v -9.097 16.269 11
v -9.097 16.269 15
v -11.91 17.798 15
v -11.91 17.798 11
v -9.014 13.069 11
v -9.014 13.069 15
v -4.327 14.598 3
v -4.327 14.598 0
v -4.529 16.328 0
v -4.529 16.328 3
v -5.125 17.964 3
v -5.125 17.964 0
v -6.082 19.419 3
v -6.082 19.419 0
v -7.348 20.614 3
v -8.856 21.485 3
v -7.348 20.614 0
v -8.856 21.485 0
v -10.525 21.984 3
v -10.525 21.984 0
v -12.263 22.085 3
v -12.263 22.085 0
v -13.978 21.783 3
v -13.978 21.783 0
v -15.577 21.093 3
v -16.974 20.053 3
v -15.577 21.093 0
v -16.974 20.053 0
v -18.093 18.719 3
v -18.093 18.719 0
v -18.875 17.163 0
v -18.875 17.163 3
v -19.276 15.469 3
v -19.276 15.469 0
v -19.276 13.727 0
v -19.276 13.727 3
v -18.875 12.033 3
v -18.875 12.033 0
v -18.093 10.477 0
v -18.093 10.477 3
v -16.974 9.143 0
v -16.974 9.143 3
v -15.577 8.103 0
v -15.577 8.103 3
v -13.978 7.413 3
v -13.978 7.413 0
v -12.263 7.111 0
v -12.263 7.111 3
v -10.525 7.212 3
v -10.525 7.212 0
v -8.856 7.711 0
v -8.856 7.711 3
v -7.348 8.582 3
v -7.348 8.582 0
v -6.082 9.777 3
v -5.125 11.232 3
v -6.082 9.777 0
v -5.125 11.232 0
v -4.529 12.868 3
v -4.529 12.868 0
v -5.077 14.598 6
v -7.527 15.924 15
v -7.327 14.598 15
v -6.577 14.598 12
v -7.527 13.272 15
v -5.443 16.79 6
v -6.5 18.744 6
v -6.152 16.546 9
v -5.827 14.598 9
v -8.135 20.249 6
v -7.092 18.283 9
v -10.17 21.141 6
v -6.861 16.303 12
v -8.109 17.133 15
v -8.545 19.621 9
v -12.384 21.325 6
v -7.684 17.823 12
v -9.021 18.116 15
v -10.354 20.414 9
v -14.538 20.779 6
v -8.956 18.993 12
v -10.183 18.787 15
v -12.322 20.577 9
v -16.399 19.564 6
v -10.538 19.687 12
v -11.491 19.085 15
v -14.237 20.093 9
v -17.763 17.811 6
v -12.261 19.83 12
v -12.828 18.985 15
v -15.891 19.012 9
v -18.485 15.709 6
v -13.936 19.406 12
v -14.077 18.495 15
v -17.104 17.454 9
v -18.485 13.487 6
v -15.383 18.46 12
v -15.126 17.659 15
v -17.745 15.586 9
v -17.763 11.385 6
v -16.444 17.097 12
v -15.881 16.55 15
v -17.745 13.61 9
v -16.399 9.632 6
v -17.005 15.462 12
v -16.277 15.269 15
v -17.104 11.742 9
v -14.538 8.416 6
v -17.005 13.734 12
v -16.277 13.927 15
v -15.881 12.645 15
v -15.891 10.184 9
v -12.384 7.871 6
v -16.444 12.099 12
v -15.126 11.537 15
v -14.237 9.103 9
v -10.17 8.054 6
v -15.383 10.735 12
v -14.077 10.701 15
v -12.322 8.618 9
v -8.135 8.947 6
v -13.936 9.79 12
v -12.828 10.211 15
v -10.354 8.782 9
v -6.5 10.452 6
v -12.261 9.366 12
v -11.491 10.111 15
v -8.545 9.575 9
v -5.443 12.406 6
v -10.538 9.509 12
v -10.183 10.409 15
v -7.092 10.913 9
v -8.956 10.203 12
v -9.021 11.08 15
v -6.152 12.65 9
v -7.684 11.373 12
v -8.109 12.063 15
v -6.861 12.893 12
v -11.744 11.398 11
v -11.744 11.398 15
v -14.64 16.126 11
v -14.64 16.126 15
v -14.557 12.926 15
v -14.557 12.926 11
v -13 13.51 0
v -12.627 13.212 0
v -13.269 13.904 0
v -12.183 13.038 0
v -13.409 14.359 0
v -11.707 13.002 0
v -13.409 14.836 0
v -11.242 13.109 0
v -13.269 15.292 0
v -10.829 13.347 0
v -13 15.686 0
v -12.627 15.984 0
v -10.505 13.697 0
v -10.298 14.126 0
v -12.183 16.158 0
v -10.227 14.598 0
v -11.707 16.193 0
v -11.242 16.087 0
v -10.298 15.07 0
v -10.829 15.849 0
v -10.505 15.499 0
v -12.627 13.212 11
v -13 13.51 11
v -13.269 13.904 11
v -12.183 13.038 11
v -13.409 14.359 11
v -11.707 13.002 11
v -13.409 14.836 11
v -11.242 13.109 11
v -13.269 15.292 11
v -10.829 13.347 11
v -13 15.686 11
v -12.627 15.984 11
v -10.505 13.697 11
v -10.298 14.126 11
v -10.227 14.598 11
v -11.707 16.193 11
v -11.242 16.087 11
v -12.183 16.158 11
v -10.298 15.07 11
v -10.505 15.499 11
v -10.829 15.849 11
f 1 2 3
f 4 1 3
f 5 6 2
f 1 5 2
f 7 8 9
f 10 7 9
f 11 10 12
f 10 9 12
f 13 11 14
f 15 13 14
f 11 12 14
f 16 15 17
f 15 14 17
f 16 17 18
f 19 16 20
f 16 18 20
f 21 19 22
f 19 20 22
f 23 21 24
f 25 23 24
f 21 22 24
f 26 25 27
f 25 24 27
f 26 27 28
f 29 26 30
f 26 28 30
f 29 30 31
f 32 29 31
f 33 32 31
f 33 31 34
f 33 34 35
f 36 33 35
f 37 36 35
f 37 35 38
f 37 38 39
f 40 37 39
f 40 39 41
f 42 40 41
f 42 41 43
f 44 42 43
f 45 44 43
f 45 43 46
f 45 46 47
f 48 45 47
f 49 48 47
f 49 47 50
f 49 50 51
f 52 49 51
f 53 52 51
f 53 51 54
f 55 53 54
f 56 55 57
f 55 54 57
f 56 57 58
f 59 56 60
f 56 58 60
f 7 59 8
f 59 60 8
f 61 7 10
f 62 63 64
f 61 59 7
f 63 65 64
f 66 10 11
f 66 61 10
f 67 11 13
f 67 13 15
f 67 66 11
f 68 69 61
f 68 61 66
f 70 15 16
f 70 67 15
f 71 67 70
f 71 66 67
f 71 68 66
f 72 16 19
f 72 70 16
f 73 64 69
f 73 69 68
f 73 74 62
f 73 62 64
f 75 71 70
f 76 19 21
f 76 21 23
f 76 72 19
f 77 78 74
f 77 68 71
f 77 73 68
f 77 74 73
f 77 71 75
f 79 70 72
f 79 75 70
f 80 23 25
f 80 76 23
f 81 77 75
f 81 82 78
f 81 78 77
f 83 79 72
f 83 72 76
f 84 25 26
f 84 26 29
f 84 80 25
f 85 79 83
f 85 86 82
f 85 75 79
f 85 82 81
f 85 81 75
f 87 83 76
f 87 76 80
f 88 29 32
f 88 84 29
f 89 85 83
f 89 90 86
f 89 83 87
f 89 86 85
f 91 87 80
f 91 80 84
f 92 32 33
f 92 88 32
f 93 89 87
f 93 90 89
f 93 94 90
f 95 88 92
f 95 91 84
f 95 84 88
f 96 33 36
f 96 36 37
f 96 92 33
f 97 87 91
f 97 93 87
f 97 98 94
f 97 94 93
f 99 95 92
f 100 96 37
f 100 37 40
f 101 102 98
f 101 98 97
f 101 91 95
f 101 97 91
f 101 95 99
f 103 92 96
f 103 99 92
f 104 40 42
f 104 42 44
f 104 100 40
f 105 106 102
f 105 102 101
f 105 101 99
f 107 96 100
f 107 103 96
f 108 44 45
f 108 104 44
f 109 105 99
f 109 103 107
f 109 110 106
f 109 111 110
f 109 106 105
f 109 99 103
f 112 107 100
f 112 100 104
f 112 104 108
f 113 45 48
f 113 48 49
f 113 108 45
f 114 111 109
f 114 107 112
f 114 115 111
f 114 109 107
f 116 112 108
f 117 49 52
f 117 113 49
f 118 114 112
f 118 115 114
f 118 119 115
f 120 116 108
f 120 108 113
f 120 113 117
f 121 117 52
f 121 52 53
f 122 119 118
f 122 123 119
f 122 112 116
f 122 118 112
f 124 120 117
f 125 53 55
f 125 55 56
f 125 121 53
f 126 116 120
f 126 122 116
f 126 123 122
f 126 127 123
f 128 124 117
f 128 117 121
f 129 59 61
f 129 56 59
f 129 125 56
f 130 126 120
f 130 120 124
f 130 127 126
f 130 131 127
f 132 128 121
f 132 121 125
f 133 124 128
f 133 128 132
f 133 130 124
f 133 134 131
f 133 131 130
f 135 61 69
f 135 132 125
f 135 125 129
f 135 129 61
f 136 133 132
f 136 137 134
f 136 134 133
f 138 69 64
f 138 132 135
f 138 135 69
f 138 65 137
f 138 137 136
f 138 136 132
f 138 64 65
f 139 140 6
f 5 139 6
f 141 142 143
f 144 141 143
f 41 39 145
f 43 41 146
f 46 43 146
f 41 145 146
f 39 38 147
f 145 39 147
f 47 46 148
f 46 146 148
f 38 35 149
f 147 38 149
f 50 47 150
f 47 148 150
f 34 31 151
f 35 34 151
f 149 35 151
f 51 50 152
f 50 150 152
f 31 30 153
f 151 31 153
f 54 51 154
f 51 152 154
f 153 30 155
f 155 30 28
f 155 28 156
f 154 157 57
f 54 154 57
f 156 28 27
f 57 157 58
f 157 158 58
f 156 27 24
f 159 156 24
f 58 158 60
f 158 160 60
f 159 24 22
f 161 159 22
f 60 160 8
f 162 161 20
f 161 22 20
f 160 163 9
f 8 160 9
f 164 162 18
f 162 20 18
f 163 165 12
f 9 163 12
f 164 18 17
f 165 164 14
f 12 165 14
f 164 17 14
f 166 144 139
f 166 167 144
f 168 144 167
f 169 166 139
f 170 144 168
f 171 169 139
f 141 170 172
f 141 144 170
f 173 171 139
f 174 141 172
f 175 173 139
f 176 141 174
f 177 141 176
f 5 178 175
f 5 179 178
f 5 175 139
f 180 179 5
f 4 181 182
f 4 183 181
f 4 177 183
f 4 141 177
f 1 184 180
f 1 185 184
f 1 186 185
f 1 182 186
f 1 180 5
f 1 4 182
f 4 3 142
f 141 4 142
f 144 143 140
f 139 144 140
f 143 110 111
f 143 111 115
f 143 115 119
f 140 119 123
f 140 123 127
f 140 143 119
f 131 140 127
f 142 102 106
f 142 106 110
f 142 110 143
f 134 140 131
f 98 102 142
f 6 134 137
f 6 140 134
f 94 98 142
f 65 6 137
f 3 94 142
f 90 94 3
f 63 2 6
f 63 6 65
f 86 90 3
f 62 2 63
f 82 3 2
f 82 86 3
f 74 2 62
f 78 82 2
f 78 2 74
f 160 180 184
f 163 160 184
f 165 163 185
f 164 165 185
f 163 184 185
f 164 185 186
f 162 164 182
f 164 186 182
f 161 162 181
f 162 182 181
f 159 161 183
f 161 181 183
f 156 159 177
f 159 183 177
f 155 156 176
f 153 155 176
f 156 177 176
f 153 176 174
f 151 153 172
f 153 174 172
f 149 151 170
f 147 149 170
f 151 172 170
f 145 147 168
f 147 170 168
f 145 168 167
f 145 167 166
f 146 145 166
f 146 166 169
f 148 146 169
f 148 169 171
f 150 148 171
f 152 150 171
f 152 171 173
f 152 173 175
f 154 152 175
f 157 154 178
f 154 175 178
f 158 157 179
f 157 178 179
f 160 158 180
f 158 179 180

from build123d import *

# Parameters (mm, degrees)
F0_R     = 7.5
F1_DEPTH = 3
F2_R     = 7.5
F3_DEPTH = 12
F4_SIZE2 = 3
F4_SIZE  = 12
F6_DEPTH = 4
F7_R     = 1.6
F8_DEPTH = 11


with BuildPart() as f1:
    # F0 (on Top) → F1 (new body)
    with BuildSketch(Plane.XY):
        with Locations((-11.8269938976, 14.5979337394)):
            Circle(F0_R)
    extrude(amount=F1_DEPTH)

    # F2 (on face) → F3 (join)
    with BuildSketch(Plane.XY.offset(3)):
        with Locations((-11.8269938976, 14.5979337394)):
            Circle(F2_R)
    extrude(amount=F3_DEPTH)

    # F4
    f4_edges = [f1.edges().sort_by_distance(p)[0] for p in [
        (-19.326994, 14.597934, 15),
    ]]
    f4_side = f1.faces().sort_by_distance((-19.326994, 14.597934, 7.5))[0]
    chamfer(f4_edges, length=F4_SIZE, length2=F4_SIZE2, reference=f4_side)

    # F5 (on face) → F6 (cut)
    with BuildSketch(Plane.XY.offset(15)):
        Polygon((-11.9095443248, 17.7979337394), (-14.6395504033, 16.1264429724), (-14.5569999761, 12.9264429724), (-11.7444434704, 11.3979337394), (-9.0144373918, 13.0694245065), (-9.096987819, 16.2694245065), align=None)
    extrude(amount=-F6_DEPTH, mode=Mode.SUBTRACT)

    # F7 (on face) → F8 (cut)
    with BuildSketch(Plane.XY.offset(11)):
        with Locations((-11.8269938976, 14.5979337394)):
            Circle(F7_R)
    extrude(amount=-F8_DEPTH, mode=Mode.SUBTRACT)


solid = f1.part
